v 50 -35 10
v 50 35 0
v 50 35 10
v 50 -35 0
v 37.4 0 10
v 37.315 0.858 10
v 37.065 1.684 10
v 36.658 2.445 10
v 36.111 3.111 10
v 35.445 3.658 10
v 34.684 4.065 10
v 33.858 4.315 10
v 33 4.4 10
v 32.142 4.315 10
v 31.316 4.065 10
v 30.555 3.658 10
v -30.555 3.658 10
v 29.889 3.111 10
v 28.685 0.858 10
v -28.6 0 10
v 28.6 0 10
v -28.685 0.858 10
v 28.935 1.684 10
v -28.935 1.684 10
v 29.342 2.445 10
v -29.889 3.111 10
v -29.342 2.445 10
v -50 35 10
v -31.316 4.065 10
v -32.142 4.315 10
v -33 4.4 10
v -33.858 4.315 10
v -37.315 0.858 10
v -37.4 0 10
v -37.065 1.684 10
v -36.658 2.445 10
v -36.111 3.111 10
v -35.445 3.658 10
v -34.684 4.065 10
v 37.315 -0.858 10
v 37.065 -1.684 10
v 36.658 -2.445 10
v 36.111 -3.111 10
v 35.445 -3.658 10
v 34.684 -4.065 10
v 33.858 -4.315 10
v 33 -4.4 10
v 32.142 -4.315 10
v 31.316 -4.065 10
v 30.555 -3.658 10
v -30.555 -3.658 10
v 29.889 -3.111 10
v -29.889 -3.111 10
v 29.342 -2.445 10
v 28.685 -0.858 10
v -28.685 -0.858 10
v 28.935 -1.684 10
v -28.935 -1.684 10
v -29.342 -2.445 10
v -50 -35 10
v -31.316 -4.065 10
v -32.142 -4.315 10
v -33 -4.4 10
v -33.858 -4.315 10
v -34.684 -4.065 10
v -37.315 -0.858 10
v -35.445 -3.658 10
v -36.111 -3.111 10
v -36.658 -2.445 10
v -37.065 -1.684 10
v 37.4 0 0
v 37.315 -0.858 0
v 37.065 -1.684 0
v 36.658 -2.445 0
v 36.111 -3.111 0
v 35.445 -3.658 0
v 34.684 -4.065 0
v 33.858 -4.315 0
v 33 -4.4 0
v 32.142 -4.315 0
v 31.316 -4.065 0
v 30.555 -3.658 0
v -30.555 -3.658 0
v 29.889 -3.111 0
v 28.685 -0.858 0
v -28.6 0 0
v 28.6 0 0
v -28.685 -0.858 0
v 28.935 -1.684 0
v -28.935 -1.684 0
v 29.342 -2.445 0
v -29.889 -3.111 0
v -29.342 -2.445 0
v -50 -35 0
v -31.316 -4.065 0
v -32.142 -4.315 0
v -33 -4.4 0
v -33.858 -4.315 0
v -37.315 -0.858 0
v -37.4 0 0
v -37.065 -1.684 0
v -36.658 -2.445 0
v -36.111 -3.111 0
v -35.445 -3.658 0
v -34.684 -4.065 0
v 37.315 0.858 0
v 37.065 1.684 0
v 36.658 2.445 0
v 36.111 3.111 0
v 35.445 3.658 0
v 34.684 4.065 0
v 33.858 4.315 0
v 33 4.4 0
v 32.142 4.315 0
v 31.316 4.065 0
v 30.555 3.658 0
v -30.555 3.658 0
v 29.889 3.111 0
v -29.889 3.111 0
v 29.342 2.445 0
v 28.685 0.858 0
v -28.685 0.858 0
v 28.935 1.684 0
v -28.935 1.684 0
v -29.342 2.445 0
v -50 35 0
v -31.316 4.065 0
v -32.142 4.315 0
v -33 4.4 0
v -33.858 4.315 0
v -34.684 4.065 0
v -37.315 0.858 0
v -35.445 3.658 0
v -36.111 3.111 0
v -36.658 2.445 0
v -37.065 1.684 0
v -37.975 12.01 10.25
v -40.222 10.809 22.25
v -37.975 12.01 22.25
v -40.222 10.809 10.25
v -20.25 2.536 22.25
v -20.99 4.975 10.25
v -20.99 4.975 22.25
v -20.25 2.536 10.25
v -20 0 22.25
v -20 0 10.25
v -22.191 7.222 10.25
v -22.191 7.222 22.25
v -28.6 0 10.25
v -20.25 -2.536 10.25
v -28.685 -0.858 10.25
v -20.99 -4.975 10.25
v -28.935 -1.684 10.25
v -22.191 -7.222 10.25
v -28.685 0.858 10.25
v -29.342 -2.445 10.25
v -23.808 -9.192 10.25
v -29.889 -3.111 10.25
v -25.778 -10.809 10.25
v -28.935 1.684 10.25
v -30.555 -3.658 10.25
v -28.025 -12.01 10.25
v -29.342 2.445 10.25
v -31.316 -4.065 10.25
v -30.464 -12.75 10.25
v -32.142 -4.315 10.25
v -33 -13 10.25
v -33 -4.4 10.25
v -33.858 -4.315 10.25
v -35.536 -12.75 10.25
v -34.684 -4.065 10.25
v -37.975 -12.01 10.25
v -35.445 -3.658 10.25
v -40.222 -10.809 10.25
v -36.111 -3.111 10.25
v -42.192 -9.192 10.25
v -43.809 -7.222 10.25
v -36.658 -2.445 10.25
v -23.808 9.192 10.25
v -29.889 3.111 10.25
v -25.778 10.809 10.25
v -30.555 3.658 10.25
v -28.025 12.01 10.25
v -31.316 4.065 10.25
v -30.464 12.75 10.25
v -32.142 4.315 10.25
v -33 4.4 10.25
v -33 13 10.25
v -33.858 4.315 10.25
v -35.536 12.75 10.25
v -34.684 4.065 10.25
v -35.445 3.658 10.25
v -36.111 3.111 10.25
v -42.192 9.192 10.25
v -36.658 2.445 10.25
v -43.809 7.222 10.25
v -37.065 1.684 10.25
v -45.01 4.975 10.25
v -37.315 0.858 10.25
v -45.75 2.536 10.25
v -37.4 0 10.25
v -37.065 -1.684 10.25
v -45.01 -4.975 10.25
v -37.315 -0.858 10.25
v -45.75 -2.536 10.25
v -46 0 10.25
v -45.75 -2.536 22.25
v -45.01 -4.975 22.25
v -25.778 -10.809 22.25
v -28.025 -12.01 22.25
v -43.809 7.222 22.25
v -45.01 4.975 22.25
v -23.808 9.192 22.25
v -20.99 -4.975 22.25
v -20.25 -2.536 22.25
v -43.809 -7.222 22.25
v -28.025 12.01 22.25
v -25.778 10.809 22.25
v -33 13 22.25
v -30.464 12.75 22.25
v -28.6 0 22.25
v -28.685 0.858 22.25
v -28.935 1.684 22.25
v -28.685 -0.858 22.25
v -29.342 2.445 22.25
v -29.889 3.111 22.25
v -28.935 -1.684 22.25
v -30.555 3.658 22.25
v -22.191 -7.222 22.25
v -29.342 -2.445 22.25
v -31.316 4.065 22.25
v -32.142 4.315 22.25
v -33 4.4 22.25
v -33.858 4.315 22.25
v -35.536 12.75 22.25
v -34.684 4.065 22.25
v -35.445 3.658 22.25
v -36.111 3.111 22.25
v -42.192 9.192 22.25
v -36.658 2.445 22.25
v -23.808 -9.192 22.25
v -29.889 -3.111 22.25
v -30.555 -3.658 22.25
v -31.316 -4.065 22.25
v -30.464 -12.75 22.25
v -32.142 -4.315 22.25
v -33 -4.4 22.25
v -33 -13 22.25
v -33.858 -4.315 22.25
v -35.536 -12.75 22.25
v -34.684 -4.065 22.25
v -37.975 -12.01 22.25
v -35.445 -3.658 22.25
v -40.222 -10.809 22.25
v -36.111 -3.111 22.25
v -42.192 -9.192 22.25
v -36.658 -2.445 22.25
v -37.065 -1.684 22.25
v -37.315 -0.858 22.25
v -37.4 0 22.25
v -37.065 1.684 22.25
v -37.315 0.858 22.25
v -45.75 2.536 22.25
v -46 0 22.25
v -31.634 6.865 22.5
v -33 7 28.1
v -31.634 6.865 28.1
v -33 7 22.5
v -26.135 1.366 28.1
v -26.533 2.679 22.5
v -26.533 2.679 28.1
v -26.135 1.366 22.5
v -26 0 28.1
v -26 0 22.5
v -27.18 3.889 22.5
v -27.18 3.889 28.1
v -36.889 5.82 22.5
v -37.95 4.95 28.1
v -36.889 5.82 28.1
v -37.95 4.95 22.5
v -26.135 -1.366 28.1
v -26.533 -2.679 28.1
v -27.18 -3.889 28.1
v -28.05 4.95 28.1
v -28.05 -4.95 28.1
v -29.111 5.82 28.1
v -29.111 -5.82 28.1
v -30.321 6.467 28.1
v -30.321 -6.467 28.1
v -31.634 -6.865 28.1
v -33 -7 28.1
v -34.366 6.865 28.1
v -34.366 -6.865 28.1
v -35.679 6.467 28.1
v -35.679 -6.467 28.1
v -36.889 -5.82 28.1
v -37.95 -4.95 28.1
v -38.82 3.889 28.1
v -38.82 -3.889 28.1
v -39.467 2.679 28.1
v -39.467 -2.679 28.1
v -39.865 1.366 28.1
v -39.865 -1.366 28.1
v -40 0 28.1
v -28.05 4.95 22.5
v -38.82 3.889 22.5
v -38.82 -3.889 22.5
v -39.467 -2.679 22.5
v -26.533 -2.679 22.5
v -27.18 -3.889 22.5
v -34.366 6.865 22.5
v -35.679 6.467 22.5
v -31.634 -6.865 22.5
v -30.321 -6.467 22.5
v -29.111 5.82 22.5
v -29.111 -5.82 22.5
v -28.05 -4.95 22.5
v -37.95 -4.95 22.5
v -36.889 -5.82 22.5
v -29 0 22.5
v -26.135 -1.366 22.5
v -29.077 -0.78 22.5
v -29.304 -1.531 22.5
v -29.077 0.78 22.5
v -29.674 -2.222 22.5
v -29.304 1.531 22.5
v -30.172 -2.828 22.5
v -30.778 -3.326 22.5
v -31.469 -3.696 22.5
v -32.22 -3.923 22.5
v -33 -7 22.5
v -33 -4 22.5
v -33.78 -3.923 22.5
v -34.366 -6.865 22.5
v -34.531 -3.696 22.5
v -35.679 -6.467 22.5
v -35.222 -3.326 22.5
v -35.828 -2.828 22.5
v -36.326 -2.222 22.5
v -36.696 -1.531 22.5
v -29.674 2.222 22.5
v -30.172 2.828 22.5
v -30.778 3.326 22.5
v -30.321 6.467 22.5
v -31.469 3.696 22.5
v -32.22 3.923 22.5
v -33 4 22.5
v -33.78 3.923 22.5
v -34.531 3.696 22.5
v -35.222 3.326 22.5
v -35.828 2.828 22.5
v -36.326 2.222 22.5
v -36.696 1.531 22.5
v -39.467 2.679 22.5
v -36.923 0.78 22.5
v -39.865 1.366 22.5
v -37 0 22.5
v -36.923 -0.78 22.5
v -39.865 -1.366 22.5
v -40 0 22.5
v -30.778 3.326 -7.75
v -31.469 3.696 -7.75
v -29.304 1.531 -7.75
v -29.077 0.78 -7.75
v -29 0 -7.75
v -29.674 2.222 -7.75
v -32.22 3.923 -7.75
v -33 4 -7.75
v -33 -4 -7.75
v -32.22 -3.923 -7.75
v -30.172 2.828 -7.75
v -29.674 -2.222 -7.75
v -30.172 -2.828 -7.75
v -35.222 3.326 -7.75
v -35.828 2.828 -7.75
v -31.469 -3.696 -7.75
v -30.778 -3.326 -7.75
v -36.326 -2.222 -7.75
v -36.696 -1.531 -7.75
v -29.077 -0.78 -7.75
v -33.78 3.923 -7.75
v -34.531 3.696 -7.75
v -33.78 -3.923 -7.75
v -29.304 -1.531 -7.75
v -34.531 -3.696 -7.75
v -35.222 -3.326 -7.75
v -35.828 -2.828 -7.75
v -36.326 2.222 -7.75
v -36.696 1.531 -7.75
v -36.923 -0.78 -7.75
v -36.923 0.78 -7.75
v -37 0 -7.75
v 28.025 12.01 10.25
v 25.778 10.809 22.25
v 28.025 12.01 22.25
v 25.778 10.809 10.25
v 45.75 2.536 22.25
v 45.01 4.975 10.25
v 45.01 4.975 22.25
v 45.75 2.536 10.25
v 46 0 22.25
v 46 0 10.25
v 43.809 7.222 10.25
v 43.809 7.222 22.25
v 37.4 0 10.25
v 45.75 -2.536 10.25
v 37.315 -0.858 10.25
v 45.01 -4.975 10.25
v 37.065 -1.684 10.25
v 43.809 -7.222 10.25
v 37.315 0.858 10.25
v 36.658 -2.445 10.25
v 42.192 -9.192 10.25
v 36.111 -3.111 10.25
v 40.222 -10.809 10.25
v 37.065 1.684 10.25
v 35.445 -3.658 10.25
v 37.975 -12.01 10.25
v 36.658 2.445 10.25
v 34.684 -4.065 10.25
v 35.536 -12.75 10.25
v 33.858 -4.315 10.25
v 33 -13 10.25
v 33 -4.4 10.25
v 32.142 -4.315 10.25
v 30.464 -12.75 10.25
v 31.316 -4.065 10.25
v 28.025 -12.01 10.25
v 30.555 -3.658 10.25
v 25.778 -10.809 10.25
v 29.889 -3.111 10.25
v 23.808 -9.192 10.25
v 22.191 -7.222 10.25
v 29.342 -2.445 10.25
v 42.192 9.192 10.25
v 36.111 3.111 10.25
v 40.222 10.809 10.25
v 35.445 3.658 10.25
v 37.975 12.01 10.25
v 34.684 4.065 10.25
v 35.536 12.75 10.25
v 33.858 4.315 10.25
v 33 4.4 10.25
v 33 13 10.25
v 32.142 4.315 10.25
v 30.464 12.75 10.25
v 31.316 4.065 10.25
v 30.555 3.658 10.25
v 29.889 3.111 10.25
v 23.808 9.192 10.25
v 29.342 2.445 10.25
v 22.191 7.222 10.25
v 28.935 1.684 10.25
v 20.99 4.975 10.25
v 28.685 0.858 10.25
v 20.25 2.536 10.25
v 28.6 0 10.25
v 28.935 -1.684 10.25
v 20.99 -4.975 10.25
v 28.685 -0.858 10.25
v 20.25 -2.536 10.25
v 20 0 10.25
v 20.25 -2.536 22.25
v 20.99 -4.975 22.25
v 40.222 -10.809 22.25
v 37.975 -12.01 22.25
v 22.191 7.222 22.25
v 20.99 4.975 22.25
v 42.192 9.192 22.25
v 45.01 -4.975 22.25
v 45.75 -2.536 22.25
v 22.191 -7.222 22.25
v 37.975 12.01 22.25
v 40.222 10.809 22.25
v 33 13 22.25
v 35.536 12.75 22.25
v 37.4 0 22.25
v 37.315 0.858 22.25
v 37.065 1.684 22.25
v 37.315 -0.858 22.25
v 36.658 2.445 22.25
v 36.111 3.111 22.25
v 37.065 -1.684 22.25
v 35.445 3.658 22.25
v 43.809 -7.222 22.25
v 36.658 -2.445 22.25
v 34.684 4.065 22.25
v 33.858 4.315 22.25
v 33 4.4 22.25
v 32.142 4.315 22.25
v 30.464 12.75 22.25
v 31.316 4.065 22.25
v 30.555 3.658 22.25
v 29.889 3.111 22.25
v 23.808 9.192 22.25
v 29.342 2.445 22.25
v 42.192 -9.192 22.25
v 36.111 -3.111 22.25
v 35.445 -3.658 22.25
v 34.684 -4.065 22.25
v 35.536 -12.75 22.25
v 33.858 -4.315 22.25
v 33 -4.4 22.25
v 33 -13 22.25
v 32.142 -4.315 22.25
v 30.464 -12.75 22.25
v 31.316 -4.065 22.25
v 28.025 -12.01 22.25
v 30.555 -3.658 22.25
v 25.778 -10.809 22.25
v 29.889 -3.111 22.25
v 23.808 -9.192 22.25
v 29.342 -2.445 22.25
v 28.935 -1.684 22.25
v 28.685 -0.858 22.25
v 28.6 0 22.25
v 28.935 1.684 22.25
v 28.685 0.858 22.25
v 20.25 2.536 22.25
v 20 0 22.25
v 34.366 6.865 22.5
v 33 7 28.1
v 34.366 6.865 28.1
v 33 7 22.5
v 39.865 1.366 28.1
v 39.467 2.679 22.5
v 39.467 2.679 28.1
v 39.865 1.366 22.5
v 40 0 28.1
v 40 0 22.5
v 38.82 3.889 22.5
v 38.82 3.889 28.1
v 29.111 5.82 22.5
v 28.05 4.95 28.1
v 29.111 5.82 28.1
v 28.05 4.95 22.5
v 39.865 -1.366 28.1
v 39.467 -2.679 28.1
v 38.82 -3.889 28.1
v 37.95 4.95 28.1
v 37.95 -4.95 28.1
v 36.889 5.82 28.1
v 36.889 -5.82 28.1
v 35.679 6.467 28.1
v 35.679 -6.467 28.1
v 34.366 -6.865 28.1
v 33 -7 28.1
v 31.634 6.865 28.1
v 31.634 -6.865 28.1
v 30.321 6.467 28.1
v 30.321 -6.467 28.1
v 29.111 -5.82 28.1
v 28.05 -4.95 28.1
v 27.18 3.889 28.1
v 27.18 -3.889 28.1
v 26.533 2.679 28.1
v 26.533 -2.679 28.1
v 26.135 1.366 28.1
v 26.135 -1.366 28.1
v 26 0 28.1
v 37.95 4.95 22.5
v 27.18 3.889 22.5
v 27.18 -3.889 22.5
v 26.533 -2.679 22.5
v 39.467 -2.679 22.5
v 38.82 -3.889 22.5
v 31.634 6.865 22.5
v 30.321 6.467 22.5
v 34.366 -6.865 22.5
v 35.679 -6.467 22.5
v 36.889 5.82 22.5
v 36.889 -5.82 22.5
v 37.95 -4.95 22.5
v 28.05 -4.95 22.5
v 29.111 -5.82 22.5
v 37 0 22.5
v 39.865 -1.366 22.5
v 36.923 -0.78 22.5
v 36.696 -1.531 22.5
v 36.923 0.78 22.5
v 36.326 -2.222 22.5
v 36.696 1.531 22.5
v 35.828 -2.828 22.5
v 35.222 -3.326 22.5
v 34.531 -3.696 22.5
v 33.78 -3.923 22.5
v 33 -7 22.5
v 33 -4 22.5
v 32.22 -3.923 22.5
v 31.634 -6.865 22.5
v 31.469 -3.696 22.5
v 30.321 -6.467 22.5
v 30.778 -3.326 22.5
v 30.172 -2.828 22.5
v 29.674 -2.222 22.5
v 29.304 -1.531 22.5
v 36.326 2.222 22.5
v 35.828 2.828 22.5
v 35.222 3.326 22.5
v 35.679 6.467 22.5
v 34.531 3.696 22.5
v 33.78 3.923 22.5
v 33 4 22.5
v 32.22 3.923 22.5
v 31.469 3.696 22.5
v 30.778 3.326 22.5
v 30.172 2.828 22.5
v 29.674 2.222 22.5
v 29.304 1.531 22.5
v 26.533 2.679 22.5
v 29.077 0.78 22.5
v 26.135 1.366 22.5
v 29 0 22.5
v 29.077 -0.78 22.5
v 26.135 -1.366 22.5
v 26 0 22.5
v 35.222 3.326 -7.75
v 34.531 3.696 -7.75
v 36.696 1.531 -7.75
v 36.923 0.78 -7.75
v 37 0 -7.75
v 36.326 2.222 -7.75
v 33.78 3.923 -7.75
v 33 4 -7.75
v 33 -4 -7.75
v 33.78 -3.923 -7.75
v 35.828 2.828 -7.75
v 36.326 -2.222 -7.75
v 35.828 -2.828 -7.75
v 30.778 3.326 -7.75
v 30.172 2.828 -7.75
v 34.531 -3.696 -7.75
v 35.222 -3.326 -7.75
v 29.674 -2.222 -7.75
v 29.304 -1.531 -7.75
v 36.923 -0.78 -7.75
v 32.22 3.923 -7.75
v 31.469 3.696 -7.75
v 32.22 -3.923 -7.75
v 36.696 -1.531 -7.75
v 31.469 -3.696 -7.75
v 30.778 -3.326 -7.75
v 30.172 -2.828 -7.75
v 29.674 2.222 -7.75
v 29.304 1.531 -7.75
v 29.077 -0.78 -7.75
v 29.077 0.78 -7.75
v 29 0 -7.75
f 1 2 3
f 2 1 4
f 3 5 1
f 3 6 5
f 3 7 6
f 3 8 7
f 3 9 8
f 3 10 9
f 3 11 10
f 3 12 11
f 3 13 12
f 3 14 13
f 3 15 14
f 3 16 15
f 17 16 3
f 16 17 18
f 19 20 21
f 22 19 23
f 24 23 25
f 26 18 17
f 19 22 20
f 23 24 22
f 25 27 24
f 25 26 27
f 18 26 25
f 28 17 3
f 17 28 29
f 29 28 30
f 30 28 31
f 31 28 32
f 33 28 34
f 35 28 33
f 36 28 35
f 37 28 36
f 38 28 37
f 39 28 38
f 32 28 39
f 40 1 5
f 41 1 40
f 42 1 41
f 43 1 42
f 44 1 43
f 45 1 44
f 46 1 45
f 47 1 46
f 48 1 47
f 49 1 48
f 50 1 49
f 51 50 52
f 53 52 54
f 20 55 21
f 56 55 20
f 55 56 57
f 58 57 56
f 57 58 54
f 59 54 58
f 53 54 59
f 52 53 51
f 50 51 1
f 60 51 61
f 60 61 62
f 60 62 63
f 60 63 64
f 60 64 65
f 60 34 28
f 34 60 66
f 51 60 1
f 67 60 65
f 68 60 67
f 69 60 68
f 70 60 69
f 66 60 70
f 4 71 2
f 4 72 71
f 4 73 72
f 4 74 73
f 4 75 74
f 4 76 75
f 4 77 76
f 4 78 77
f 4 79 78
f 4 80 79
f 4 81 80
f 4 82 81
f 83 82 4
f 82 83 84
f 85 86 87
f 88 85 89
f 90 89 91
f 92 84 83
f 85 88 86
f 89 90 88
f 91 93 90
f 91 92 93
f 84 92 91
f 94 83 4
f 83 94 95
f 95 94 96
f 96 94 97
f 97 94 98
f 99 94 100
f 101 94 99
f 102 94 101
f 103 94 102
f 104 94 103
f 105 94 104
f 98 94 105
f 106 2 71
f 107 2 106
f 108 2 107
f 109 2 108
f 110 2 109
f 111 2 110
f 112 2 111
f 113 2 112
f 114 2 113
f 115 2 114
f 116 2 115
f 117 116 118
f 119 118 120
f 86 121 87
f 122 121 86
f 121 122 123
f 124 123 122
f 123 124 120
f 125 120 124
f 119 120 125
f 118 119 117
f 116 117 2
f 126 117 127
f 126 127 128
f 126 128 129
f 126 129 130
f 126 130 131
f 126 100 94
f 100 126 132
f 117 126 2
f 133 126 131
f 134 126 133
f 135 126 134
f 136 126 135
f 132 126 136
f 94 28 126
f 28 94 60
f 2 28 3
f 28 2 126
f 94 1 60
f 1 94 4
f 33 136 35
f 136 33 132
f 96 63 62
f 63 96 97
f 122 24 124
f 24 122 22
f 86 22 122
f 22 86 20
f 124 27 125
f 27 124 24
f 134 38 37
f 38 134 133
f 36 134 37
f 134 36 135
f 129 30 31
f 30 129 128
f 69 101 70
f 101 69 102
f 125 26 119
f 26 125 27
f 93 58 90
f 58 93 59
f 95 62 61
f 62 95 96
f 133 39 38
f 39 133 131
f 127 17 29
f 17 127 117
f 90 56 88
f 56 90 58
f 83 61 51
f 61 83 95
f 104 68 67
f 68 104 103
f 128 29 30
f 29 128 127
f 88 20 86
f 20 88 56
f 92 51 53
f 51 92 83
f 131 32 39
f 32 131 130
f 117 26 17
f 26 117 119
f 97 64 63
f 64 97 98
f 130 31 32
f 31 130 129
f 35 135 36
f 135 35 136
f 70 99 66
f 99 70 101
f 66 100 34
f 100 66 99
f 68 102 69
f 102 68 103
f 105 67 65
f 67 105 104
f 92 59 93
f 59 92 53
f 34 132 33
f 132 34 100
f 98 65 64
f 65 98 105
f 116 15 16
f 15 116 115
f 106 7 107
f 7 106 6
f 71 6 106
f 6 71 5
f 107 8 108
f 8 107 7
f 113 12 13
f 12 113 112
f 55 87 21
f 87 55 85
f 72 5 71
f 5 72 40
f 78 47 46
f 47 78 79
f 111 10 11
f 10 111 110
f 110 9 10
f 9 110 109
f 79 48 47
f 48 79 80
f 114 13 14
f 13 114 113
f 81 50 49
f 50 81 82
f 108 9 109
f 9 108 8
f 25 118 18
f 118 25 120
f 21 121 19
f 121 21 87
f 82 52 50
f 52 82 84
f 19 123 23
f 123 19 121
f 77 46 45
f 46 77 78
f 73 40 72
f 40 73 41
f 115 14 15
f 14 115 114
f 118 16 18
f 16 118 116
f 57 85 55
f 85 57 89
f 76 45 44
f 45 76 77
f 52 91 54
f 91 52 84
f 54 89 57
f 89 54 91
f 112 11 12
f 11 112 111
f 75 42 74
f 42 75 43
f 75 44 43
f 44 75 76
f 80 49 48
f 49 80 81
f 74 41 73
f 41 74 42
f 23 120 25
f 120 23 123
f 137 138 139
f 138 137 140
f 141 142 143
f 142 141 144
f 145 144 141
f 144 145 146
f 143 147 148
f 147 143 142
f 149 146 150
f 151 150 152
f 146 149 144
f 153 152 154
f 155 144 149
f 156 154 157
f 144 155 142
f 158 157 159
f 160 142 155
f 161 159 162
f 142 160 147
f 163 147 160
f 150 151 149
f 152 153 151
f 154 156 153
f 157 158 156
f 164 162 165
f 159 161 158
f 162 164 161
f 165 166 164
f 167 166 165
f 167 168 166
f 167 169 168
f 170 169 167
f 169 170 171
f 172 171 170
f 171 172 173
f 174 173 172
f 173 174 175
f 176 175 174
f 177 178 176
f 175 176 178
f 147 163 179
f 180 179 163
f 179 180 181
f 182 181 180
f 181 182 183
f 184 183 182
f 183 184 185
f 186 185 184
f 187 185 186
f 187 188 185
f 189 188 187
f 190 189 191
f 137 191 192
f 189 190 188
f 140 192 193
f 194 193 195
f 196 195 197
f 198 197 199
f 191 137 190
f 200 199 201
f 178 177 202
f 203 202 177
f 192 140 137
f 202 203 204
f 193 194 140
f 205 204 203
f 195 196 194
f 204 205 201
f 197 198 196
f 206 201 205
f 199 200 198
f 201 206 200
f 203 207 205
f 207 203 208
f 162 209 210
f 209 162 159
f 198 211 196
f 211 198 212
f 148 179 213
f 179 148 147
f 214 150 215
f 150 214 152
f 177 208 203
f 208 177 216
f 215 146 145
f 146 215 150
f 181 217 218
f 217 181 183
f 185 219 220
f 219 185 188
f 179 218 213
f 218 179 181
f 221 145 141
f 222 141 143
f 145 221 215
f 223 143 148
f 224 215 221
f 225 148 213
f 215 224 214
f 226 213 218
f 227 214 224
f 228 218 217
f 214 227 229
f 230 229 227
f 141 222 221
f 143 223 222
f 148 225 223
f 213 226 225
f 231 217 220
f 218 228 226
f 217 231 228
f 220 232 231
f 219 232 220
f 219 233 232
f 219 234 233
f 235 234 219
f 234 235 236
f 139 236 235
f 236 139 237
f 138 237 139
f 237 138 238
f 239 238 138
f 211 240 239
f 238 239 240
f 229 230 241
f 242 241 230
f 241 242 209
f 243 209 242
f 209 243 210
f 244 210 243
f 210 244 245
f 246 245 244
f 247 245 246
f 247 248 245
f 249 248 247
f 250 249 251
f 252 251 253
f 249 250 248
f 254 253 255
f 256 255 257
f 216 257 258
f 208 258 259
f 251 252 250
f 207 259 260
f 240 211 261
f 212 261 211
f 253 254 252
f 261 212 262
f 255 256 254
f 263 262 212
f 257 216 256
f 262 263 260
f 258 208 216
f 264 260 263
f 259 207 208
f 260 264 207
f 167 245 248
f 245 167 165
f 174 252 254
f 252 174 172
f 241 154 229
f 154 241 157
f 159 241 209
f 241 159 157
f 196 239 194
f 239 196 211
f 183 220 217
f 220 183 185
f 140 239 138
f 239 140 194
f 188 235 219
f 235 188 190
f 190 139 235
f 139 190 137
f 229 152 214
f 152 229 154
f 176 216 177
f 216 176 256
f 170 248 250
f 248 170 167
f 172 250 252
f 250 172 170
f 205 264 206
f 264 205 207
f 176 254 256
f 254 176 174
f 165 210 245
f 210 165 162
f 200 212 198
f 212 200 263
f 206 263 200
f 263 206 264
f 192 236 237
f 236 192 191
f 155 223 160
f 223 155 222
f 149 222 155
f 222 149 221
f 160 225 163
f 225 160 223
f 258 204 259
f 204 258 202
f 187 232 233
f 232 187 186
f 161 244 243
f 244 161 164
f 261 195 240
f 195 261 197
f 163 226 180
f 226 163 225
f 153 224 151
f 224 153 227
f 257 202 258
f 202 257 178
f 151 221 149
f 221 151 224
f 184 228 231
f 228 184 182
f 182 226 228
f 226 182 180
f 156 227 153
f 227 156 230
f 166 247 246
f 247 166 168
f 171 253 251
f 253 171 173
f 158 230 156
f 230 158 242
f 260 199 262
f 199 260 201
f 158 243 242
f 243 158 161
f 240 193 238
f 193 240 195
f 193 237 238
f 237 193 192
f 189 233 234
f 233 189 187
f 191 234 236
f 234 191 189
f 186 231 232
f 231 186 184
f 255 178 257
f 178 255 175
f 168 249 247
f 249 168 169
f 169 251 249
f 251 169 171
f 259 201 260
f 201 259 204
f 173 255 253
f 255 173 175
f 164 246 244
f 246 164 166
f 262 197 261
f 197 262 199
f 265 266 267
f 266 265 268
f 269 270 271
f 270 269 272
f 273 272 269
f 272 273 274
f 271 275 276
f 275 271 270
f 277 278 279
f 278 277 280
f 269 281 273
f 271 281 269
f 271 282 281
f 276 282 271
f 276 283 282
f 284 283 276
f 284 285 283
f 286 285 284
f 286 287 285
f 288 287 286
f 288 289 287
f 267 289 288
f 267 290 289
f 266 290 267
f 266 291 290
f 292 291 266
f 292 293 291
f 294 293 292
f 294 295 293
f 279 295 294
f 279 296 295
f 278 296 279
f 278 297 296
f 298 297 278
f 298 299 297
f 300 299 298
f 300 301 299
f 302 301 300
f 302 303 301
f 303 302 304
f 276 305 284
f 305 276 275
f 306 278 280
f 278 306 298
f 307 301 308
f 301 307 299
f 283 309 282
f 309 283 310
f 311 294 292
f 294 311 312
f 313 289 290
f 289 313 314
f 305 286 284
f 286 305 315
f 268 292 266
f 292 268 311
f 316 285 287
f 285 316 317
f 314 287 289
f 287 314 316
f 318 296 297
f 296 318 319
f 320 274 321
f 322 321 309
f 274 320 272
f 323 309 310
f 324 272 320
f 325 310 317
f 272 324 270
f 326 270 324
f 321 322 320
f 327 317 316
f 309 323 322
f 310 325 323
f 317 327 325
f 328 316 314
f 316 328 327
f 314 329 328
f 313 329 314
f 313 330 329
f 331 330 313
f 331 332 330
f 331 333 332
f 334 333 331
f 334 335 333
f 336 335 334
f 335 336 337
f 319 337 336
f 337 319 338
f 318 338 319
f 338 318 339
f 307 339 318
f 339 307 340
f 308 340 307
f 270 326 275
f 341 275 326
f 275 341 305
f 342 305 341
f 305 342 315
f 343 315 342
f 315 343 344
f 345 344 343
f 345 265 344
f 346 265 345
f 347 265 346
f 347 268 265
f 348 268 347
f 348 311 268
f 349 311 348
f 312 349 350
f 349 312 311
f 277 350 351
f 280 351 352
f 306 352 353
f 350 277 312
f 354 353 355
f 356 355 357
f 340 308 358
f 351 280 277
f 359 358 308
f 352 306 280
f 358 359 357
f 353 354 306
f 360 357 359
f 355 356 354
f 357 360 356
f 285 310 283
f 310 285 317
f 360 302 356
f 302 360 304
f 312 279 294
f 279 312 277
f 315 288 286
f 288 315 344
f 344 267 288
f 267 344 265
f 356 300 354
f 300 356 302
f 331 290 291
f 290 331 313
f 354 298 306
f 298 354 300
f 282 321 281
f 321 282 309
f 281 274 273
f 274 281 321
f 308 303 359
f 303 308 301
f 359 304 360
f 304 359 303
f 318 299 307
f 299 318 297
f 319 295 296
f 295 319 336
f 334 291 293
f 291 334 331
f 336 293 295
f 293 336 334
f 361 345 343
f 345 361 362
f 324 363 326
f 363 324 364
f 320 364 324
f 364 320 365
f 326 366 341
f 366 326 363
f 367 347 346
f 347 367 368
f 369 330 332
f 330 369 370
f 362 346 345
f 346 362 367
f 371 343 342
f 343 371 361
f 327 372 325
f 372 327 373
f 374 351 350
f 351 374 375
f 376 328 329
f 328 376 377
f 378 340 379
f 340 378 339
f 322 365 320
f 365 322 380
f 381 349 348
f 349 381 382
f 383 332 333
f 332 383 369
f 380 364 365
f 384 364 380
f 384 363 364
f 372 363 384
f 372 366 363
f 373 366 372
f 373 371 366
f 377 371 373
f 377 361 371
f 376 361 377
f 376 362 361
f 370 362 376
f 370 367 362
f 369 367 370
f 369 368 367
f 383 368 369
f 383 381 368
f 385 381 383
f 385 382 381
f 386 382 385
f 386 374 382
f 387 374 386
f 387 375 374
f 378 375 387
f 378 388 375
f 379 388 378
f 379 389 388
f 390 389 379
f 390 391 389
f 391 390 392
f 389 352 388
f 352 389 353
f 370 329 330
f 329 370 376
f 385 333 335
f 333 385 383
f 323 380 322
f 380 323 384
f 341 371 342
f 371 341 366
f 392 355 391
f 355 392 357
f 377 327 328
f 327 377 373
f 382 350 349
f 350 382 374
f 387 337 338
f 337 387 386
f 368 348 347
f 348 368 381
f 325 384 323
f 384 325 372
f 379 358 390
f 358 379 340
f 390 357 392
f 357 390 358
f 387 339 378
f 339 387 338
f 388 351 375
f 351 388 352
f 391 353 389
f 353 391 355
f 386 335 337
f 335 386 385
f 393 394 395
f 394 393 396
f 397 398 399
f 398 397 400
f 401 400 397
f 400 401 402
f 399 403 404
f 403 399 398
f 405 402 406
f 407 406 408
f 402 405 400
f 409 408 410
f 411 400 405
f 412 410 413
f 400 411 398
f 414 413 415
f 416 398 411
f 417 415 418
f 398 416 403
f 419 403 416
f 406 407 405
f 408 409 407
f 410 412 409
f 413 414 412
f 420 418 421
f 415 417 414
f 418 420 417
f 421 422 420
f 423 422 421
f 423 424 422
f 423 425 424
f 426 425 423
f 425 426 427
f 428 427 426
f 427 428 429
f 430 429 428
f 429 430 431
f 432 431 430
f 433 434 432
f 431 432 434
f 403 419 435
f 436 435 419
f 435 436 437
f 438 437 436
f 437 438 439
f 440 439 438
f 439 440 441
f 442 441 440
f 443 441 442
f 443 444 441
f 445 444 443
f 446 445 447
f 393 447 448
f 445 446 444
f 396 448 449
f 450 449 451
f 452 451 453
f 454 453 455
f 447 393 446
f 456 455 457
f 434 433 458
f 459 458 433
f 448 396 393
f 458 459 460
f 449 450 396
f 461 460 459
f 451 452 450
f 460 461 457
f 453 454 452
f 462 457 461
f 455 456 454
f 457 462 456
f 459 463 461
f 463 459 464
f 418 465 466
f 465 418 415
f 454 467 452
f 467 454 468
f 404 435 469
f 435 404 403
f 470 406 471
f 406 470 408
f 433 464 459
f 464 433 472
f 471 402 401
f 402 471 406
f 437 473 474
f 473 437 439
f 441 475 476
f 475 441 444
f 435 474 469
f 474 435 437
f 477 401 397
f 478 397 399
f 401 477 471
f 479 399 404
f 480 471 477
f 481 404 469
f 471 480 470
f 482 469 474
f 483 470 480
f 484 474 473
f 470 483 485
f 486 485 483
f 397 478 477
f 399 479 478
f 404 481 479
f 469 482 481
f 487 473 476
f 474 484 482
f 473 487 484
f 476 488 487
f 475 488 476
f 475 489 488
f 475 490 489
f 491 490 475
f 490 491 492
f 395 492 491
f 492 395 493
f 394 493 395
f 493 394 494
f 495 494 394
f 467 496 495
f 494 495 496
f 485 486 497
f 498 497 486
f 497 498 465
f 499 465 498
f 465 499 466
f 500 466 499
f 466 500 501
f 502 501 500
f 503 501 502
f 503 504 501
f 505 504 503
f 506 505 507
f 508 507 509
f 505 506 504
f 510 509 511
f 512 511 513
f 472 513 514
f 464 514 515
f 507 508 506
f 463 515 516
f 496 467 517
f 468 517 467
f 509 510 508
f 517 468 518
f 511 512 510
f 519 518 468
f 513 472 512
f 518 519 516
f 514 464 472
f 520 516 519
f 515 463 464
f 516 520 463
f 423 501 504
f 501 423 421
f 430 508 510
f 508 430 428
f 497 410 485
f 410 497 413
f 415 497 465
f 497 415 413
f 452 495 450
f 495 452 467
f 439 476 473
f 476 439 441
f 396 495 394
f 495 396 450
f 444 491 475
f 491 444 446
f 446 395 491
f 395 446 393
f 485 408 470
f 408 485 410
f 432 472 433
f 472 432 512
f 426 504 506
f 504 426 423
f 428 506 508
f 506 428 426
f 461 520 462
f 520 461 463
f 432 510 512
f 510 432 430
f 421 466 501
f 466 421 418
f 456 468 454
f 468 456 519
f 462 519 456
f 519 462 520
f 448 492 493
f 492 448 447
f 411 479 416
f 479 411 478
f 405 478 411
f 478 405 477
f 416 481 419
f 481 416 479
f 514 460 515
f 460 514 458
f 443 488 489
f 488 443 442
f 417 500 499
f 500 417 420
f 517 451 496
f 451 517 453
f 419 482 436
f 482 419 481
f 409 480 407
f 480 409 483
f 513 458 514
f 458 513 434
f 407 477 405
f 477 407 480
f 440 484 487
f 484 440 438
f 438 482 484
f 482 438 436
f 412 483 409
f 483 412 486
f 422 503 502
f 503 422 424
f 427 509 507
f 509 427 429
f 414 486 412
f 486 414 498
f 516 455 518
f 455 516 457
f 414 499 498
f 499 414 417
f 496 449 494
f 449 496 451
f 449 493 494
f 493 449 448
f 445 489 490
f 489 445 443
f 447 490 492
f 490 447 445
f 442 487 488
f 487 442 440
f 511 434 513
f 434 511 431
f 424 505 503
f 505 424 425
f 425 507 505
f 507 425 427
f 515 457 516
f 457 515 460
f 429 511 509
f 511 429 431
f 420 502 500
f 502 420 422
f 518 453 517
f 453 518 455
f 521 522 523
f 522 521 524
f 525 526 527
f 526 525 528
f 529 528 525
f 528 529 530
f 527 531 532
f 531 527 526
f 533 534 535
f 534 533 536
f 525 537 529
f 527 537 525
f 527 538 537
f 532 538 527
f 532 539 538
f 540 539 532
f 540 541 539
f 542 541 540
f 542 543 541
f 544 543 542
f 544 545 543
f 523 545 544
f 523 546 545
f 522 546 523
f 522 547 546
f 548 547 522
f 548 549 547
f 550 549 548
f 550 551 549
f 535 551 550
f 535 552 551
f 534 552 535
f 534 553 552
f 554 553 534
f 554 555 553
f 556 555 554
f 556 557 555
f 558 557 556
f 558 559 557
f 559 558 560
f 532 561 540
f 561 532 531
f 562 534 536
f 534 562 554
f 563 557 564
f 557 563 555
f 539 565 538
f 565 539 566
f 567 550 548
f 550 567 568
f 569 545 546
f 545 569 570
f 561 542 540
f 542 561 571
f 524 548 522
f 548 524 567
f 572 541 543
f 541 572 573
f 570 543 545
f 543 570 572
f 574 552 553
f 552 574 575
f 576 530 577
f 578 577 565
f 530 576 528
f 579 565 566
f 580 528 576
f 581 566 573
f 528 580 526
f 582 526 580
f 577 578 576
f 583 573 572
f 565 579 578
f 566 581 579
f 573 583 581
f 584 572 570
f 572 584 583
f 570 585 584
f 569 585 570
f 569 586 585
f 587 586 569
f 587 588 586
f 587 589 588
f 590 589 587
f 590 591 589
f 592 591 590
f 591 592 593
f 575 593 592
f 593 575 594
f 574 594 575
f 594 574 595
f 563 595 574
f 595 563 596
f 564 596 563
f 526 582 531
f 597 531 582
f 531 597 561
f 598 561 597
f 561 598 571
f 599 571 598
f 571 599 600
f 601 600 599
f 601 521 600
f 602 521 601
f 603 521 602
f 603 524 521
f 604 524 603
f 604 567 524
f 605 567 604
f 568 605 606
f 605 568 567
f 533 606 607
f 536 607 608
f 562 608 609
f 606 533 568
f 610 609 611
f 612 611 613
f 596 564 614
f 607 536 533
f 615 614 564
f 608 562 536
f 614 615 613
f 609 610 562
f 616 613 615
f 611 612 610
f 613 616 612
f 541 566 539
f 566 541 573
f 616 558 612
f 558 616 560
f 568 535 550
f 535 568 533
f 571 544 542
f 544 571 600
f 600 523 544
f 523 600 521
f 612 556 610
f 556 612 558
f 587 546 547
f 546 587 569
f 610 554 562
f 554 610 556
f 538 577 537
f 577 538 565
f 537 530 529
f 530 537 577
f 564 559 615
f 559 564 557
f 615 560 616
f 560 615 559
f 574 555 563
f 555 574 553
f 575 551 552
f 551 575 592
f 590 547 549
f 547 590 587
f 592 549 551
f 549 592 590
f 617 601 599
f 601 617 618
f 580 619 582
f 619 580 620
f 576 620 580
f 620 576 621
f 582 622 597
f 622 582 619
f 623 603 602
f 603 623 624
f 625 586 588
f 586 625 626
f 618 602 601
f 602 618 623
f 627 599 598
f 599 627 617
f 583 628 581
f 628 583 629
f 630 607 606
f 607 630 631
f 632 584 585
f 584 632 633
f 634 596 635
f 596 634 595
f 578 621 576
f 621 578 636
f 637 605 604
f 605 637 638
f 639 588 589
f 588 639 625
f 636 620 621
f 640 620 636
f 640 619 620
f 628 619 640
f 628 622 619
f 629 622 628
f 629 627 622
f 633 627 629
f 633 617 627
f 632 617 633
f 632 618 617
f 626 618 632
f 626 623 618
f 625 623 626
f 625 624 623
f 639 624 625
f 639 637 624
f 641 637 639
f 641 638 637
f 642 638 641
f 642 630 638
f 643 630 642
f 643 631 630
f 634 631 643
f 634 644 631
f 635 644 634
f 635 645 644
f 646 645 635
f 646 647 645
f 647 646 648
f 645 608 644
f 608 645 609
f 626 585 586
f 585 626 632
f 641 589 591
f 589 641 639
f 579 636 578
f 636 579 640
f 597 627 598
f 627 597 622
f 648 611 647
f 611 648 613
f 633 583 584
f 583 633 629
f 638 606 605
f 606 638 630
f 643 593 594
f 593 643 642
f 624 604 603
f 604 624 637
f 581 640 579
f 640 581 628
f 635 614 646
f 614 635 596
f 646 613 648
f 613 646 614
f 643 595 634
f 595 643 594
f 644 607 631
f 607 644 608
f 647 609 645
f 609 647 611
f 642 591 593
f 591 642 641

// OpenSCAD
$fn = 32;

// ------------------------------------------------------------------------
// Standoff columns: 2 d26 standoffs, bolts d8
// Every part is its own module, assembly() places them once.
// ------------------------------------------------------------------------

// --- part 1 ---
module base_plate() {
  difference() {
    translate([-50, -35, 0]) cube([100, 70, 10]);
    translate([-33, 0, -1]) cylinder(h = 12, d = 8.8);
    translate([33, 0, -1]) cylinder(h = 12, d = 8.8);
  }
}

// --- part 2 ---
module spacer1() {
  difference() {
      translate([0, 0, 0]) cylinder(h = 12, d = 26);
      translate([0, 0, -1]) cylinder(h = 14, d = 8.8);
    }
}

// --- part 3 ---
module bolt1() {
  cylinder(h = 5.6, d = 14);
  translate([0, 0, -30.25]) cylinder(h = 30.25, d = 8);
}

// --- part 4 ---
module spacer2() {
  difference() {
      translate([0, 0, 0]) cylinder(h = 12, d = 26);
      translate([0, 0, -1]) cylinder(h = 14, d = 8.8);
    }
}

// --- part 5 ---
module bolt2() {
  cylinder(h = 5.6, d = 14);
  translate([0, 0, -30.25]) cylinder(h = 30.25, d = 8);
}

// --- assembly ---
module assembly() {
  translate([0, 0, 0]) rotate([0, 0, 0]) base_plate();
  translate([-33, 0, 10.25]) rotate([0, 0, 0]) spacer1();
  translate([-33, 0, 22.5]) rotate([0, 0, 0]) bolt1();
  translate([33, 0, 10.25]) rotate([0, 0, 0]) spacer2();
  translate([33, 0, 22.5]) rotate([0, 0, 0]) bolt2();
}

assembly();
